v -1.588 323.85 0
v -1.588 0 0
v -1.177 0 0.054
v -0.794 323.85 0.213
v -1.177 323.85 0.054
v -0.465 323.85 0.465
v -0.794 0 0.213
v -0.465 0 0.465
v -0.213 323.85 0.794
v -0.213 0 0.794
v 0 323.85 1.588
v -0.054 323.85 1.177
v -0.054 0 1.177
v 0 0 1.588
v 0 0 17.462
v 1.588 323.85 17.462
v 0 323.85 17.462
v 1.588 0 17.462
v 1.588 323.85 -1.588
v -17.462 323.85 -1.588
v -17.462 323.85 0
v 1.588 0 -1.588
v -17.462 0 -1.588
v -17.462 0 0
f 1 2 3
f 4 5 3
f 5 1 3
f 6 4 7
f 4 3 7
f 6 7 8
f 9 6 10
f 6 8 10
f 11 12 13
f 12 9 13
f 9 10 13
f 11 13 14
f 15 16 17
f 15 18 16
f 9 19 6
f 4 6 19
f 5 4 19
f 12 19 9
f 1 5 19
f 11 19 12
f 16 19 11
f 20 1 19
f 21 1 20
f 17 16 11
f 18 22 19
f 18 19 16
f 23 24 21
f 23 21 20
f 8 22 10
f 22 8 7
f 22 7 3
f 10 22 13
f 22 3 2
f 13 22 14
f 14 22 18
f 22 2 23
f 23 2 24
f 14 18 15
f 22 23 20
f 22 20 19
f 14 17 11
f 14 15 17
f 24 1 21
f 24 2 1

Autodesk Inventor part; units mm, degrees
ref_plane "YZ Plane" through (0, 0, 0) normal (1, 0, 0) x (0, 1, 0)
ref_plane "XZ Plane" through (0, 0, 0) normal (0, 1, 0) x (-1, 0, 0)
ref_plane "XY Plane" through (0, 0, 0) normal (0, 0, 1) x (1, 0, 0)
sketch "Sketch1" plane through (0, 0, 0) normal (0, 1, 0) x (-1, 0, 0)
  line L0 (0, 17.4625) -> (0, 1.5875)
  line L1 (1.5875, 0) -> (17.4625, 0)
  line L2 (17.4625, 0) -> (17.4625, -1.5875)
  line L3 (17.4625, -1.5875) -> (-1.5875, -1.5875)
  line L4 (-1.5875, -1.5875) -> (-1.5875, 17.4625)
  line L5 (-1.5875, 17.4625) -> (0, 17.4625)
  arc A0 (0, 1.5875) -> (1.5875, 0) centre (1.5875, 1.5875) ccw
  point P0 (0, 0)
  dimension "d0" = 1.5875
  dimension "d1" = 19.05
  dimension "d2" = 1.5875
extrude "Extrusion1" add sketch "Sketch1" along normal blind 323.85
properties part number "Short Wall Cross" material "Aluminum 6061"
